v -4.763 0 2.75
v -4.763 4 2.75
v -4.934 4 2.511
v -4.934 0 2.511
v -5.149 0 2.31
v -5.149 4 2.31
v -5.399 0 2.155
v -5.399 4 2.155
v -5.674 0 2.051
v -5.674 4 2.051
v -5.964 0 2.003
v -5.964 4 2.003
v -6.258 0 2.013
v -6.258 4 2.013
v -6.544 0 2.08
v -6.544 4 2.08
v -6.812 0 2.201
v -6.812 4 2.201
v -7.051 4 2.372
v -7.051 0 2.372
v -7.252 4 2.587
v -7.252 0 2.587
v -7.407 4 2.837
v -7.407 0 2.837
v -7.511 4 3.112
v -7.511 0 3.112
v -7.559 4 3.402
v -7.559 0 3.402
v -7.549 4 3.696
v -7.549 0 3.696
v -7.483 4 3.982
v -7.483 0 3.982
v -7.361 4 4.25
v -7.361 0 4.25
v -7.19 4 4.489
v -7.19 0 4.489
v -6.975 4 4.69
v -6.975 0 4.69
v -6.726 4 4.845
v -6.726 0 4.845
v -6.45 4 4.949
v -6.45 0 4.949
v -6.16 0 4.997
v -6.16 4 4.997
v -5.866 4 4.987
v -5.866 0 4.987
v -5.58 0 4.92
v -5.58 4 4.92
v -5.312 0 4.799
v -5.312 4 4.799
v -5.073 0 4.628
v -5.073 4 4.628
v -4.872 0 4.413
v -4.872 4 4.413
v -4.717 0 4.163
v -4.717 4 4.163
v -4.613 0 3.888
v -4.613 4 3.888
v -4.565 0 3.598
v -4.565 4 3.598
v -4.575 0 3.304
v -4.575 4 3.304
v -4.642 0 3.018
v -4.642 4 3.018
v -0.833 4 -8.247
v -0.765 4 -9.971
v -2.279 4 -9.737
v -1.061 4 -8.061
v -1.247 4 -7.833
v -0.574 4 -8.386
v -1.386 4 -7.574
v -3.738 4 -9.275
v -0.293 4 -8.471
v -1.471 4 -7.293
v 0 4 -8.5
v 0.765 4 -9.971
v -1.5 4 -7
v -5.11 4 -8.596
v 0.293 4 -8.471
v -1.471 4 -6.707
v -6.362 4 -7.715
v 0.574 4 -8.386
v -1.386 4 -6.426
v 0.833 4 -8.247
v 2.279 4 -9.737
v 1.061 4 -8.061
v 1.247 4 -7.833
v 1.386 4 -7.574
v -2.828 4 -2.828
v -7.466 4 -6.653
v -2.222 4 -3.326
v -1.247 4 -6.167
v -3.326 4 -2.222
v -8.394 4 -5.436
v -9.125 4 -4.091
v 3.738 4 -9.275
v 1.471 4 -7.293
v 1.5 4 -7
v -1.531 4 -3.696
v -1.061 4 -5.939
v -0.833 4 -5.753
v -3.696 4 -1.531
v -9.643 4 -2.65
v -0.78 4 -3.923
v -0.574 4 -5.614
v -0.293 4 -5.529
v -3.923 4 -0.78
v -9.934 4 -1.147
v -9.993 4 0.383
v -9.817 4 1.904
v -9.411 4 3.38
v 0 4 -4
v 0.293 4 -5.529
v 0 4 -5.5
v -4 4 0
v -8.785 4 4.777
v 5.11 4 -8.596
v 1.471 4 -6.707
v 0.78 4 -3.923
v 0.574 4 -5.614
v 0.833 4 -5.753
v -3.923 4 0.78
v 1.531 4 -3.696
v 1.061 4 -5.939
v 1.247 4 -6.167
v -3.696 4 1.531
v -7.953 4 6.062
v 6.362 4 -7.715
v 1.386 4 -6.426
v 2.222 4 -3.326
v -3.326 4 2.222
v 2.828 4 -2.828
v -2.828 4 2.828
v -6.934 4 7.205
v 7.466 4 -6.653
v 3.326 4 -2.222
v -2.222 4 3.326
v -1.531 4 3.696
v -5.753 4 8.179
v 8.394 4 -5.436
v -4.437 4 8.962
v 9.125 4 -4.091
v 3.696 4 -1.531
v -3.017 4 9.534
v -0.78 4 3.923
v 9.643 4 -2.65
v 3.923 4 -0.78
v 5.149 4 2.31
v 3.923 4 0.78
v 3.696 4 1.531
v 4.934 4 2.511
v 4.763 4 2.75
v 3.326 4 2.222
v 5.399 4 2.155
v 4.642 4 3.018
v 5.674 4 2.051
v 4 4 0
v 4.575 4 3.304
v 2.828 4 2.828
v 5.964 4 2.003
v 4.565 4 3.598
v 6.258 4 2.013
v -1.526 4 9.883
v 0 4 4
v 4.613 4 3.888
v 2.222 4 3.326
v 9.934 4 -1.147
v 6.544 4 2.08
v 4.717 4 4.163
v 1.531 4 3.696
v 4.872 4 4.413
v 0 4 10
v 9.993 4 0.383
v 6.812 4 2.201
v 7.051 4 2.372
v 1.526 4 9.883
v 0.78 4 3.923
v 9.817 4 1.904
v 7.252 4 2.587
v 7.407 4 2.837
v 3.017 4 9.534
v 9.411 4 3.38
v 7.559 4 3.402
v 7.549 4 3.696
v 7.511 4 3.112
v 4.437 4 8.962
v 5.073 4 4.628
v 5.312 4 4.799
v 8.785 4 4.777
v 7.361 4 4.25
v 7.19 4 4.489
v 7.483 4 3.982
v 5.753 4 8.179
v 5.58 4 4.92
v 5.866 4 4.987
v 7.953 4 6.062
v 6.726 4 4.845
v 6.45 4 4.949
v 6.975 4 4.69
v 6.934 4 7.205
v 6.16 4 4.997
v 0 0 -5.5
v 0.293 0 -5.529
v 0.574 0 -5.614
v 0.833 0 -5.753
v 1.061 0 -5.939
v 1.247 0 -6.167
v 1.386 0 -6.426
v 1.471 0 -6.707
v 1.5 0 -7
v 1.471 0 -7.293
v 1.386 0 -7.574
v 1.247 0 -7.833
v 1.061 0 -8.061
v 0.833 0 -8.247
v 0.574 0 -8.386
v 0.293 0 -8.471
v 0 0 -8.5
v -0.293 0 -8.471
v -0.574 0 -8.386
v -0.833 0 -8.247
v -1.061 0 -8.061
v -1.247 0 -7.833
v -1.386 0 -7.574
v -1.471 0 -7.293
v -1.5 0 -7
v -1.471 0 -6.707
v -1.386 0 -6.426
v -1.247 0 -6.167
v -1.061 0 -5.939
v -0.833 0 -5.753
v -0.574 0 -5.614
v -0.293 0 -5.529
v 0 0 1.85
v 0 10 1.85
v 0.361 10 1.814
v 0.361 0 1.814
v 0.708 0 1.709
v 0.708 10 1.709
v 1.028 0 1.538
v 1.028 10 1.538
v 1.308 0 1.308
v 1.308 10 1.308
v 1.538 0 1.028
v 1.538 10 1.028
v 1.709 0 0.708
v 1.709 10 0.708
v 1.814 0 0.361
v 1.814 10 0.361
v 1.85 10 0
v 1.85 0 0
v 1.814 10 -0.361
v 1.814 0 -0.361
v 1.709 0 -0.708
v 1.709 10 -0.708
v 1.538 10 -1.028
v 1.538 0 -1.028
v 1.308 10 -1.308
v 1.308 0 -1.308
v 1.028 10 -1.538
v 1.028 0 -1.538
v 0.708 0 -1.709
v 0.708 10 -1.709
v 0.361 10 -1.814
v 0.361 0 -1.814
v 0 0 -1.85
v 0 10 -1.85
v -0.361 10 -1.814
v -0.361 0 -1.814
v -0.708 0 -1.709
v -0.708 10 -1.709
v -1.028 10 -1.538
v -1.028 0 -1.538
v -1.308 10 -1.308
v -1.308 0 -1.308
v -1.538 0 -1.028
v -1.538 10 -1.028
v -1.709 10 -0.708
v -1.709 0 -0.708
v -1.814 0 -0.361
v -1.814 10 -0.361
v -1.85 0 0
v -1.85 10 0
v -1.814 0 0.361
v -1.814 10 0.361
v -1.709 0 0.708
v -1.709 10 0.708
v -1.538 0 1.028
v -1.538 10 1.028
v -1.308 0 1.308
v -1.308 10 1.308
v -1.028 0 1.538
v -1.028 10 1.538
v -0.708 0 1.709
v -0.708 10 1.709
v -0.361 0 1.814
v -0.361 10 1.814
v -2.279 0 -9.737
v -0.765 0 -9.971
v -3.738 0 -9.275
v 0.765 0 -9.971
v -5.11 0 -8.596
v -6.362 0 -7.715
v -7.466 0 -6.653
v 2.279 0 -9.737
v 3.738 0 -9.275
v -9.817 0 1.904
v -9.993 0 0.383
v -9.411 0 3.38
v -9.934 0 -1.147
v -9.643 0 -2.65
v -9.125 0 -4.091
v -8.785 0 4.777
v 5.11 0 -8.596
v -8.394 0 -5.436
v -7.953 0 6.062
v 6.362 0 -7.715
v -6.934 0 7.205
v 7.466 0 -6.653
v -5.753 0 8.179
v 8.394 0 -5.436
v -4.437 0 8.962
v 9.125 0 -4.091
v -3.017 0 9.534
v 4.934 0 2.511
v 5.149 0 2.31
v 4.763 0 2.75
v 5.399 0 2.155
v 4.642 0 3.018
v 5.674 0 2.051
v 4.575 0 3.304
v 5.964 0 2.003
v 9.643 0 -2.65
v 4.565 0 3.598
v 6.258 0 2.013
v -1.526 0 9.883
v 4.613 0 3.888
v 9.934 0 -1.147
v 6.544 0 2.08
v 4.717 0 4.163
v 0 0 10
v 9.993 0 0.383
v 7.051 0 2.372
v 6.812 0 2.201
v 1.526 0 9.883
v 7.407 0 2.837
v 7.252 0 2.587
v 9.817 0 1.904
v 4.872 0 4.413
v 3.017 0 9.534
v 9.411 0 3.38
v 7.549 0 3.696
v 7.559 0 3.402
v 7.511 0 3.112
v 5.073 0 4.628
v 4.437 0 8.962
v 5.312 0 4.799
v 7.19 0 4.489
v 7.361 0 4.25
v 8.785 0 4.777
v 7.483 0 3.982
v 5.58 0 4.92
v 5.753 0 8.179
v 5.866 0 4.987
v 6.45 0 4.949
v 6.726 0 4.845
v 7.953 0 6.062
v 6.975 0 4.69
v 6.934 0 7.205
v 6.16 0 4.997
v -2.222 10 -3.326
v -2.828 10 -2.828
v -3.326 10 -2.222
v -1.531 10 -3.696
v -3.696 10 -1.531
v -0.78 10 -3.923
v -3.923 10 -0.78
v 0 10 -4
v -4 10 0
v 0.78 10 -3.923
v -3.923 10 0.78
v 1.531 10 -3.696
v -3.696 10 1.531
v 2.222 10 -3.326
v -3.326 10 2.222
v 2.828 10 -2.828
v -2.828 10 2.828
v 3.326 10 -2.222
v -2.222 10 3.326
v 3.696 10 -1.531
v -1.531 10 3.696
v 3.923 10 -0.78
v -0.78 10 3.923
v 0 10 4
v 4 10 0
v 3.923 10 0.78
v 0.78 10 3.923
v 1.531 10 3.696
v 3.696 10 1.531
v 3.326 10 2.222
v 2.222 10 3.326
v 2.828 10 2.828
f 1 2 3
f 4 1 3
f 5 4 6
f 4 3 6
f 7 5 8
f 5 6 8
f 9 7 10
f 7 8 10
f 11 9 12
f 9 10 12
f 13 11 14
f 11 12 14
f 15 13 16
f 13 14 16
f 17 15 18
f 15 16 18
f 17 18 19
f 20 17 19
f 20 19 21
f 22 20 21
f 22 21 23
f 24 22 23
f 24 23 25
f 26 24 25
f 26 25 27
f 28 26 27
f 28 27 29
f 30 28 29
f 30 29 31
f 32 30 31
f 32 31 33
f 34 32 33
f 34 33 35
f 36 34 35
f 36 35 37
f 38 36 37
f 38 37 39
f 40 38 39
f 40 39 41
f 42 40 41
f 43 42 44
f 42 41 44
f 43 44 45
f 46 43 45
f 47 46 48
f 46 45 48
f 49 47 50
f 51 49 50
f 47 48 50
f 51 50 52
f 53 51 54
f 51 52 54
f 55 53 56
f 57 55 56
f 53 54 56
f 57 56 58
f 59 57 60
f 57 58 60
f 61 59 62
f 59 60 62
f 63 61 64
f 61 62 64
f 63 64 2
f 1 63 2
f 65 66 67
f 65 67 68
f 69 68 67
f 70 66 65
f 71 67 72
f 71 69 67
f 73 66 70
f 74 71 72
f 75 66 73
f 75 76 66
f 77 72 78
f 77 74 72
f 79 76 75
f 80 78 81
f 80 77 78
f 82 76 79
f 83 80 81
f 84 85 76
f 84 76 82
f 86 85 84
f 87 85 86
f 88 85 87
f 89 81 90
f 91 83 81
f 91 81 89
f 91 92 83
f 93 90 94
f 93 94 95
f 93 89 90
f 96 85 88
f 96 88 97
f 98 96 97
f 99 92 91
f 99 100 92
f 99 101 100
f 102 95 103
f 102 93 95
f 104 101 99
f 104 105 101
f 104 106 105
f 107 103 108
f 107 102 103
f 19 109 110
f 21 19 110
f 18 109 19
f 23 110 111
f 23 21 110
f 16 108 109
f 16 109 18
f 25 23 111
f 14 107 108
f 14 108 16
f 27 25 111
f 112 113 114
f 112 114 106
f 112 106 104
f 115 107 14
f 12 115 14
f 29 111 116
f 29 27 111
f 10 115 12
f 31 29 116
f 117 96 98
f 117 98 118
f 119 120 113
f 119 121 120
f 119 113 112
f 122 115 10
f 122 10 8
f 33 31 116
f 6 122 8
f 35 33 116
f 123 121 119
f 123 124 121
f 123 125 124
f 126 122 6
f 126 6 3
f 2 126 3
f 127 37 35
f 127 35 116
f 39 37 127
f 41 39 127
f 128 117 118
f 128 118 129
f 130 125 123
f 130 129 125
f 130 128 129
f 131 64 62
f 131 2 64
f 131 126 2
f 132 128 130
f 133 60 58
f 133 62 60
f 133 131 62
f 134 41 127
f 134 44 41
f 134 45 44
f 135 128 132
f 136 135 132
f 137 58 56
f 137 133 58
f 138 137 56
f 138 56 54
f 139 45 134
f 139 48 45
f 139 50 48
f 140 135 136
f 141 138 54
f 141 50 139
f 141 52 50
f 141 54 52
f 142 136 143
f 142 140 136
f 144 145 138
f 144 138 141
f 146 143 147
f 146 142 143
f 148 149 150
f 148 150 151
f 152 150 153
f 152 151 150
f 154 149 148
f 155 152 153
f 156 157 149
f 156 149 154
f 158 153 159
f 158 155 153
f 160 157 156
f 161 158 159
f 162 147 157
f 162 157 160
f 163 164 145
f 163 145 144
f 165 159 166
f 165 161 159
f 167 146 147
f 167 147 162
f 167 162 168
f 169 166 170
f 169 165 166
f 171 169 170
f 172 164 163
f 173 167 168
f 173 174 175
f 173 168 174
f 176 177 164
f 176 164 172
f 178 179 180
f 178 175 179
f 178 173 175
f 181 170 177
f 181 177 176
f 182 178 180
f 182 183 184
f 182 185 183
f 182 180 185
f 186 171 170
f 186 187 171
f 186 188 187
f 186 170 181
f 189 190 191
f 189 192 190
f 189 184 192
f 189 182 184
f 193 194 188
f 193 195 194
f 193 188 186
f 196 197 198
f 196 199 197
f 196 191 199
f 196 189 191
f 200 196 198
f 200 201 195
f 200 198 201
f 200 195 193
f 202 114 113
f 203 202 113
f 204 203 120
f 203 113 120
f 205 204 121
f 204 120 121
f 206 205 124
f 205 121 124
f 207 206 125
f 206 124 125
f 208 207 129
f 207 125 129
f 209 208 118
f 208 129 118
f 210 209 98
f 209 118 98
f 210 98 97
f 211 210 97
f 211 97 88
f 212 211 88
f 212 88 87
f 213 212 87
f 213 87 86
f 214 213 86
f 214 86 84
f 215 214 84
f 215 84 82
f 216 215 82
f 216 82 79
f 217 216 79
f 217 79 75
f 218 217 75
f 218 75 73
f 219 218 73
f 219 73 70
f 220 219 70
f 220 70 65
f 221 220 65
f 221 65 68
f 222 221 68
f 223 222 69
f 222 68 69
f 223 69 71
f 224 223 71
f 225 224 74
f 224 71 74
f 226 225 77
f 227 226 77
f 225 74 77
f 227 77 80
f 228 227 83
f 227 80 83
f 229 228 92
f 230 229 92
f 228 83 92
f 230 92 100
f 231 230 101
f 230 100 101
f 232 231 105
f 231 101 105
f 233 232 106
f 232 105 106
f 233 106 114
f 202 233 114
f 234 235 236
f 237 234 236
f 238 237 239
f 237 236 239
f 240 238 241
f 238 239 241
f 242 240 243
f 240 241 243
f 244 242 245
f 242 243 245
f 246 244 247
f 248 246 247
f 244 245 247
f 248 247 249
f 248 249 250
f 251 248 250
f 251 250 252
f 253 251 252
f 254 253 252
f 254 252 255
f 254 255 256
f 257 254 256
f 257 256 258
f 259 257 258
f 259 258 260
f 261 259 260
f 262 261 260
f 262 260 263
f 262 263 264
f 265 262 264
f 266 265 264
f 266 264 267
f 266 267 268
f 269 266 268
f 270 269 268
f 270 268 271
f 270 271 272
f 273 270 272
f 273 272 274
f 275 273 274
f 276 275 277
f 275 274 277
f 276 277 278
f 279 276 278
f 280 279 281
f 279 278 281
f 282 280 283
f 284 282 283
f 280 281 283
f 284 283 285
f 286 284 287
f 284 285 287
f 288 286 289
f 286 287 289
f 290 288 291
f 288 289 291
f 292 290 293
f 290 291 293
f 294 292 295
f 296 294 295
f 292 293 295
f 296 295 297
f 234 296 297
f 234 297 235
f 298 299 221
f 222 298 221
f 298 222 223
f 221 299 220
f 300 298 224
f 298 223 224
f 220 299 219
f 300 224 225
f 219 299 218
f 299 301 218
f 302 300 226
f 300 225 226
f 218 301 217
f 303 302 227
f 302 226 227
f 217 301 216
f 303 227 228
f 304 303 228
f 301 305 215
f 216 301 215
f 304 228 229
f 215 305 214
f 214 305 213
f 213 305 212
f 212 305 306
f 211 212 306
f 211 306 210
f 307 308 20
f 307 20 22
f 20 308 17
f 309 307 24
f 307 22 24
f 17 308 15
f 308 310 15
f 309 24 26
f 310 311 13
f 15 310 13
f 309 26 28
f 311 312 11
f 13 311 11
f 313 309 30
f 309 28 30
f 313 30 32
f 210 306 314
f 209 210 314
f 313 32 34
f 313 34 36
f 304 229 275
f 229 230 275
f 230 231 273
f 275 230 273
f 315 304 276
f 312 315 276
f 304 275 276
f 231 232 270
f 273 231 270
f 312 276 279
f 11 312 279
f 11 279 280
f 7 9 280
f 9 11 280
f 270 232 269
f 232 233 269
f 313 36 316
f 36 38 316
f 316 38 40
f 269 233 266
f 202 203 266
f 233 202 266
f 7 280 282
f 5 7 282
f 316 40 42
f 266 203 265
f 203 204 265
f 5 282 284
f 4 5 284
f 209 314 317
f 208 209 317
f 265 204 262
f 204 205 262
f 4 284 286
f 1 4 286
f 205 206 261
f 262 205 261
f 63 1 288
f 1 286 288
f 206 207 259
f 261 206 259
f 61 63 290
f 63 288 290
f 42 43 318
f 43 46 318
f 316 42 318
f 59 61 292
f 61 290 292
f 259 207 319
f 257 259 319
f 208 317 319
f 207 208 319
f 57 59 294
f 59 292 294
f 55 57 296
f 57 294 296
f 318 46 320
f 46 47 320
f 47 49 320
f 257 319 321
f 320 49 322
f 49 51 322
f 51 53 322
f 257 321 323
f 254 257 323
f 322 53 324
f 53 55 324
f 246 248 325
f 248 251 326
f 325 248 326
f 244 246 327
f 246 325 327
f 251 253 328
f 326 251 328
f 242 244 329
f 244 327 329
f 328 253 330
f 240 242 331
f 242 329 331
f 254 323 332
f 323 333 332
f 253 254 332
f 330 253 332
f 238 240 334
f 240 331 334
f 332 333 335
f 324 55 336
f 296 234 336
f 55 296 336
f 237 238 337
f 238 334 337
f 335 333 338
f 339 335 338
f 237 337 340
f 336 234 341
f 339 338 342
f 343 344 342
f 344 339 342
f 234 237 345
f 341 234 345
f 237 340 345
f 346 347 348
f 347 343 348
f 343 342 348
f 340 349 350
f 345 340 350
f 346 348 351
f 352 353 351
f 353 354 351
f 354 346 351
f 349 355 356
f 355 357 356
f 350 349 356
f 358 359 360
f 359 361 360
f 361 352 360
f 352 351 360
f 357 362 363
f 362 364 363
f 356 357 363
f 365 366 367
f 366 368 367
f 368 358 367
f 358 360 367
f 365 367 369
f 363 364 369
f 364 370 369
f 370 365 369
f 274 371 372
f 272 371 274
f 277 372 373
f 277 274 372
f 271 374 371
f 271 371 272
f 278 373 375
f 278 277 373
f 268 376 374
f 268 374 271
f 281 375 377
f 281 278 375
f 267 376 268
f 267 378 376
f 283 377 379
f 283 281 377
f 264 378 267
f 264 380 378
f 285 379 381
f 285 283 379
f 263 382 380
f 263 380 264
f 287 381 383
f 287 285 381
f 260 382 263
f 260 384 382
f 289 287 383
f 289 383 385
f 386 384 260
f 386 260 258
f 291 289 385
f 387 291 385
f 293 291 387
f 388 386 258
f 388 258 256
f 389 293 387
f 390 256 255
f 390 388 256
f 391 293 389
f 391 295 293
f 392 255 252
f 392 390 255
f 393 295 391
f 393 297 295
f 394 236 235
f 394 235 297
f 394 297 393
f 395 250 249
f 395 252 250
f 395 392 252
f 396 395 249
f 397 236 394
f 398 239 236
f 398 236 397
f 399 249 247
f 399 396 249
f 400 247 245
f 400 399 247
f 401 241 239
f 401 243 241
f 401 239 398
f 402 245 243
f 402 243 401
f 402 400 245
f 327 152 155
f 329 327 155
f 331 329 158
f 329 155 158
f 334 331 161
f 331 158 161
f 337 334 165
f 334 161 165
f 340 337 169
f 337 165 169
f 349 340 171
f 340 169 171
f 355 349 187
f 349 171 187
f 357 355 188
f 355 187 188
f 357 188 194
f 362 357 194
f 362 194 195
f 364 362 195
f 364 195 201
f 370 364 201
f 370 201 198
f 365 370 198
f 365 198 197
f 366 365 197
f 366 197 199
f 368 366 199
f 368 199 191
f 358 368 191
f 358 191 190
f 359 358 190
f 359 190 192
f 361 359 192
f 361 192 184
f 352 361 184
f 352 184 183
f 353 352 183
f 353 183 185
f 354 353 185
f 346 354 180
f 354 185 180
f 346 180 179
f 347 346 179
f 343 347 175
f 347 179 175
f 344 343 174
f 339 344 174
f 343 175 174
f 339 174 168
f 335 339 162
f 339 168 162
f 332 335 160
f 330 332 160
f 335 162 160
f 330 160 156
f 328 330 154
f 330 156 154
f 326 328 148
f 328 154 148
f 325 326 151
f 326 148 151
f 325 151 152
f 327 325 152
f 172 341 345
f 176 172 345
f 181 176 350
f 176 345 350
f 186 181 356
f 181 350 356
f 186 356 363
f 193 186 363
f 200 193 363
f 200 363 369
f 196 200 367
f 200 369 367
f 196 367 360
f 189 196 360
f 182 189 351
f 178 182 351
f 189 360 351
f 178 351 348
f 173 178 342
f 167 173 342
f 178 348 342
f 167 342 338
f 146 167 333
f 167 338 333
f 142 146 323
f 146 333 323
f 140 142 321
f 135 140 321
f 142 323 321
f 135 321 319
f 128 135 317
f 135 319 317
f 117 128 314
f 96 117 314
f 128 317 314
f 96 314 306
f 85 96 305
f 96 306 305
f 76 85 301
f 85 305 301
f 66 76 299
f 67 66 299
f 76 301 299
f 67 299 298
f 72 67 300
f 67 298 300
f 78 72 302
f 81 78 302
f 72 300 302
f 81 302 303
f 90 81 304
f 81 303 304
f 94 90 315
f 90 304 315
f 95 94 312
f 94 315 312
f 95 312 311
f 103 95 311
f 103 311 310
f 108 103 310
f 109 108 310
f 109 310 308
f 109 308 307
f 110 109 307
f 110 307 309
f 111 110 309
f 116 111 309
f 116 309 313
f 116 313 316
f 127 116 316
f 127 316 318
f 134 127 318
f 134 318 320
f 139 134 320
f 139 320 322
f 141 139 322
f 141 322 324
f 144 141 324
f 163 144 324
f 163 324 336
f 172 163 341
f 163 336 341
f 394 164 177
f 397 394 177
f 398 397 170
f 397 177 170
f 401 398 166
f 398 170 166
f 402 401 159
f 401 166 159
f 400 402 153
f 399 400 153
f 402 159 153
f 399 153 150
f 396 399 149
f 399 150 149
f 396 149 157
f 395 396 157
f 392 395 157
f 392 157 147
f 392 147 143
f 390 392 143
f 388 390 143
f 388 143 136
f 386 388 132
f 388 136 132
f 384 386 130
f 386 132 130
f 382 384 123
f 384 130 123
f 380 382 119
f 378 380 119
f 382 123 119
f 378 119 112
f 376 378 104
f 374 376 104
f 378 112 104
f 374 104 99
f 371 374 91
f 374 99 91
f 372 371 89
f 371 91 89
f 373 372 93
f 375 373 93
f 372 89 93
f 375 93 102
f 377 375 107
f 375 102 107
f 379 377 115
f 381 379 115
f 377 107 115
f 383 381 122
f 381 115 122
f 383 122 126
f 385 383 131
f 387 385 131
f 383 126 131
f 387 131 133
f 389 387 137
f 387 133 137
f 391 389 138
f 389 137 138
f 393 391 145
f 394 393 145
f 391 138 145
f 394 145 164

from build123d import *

# Parameters (mm, degrees)
SKETCH1_R           = 10
BOSS_EXTRUDE1_DEPTH = 4
SKETCH2_R           = 4
BOSS_EXTRUDE2_DEPTH = 6
SKETCH3_R           = 1.85
CUT_EXTRUDE1_DEPTH  = 18.320508076
SKETCH4_R           = 1.5
CUT_EXTRUDE2_DEPTH  = 16.362291496
CIRPATTERN1_COUNT   = 3


with BuildPart() as part:
    # Sketch1 → Boss-Extrude1 (new body)
    with BuildSketch(Plane(origin=(0, 0, 0), x_dir=(1, 0, 0), z_dir=(0, 1, 0))):
        with Locations(Location((0, 0, 0), (0, 0, 270))):
            Circle(SKETCH1_R)
    extrude(amount=BOSS_EXTRUDE1_DEPTH)

    # Sketch2 → Boss-Extrude2 (add)
    with BuildSketch(Plane(origin=(0, 4, 0), x_dir=(1, 0, 0), z_dir=(0, 1, 0))):
        with Locations(Location((0, 0, 0), (0, 0, 270))):
            Circle(SKETCH2_R)
    extrude(amount=BOSS_EXTRUDE2_DEPTH)

    # Sketch3 → Cut-Extrude1 (cut, through all)
    with BuildSketch(Plane(origin=(0, 10, 0), x_dir=(1, 0, 0), z_dir=(0, 1, 0))):
        with Locations(Location((0, 0, 0), (0, 0, 270))):
            Circle(SKETCH3_R)
    extrude(amount=-CUT_EXTRUDE1_DEPTH, mode=Mode.SUBTRACT)

    # Sketch4 → Cut-Extrude2 (cut, through all)
    with BuildSketch(Plane(origin=(0, 4, 0), x_dir=(1, 0, 0), z_dir=(0, 1, 0))):
        with Locations(Location((0, 7, 0), (0, 0, 270))):
            Circle(SKETCH4_R)
    cut_extrude2 = extrude(amount=-CUT_EXTRUDE2_DEPTH, mode=Mode.SUBTRACT)

    # CirPattern1: Cut-Extrude2 ×3 about axis
    cirpattern1_axis = Axis((0, 0, 0), (0, 1, 0))
    for i in range(1, CIRPATTERN1_COUNT):
        add(cut_extrude2.rotate(cirpattern1_axis, i * 360 / CIRPATTERN1_COUNT), mode=Mode.SUBTRACT)


solid = part.part
